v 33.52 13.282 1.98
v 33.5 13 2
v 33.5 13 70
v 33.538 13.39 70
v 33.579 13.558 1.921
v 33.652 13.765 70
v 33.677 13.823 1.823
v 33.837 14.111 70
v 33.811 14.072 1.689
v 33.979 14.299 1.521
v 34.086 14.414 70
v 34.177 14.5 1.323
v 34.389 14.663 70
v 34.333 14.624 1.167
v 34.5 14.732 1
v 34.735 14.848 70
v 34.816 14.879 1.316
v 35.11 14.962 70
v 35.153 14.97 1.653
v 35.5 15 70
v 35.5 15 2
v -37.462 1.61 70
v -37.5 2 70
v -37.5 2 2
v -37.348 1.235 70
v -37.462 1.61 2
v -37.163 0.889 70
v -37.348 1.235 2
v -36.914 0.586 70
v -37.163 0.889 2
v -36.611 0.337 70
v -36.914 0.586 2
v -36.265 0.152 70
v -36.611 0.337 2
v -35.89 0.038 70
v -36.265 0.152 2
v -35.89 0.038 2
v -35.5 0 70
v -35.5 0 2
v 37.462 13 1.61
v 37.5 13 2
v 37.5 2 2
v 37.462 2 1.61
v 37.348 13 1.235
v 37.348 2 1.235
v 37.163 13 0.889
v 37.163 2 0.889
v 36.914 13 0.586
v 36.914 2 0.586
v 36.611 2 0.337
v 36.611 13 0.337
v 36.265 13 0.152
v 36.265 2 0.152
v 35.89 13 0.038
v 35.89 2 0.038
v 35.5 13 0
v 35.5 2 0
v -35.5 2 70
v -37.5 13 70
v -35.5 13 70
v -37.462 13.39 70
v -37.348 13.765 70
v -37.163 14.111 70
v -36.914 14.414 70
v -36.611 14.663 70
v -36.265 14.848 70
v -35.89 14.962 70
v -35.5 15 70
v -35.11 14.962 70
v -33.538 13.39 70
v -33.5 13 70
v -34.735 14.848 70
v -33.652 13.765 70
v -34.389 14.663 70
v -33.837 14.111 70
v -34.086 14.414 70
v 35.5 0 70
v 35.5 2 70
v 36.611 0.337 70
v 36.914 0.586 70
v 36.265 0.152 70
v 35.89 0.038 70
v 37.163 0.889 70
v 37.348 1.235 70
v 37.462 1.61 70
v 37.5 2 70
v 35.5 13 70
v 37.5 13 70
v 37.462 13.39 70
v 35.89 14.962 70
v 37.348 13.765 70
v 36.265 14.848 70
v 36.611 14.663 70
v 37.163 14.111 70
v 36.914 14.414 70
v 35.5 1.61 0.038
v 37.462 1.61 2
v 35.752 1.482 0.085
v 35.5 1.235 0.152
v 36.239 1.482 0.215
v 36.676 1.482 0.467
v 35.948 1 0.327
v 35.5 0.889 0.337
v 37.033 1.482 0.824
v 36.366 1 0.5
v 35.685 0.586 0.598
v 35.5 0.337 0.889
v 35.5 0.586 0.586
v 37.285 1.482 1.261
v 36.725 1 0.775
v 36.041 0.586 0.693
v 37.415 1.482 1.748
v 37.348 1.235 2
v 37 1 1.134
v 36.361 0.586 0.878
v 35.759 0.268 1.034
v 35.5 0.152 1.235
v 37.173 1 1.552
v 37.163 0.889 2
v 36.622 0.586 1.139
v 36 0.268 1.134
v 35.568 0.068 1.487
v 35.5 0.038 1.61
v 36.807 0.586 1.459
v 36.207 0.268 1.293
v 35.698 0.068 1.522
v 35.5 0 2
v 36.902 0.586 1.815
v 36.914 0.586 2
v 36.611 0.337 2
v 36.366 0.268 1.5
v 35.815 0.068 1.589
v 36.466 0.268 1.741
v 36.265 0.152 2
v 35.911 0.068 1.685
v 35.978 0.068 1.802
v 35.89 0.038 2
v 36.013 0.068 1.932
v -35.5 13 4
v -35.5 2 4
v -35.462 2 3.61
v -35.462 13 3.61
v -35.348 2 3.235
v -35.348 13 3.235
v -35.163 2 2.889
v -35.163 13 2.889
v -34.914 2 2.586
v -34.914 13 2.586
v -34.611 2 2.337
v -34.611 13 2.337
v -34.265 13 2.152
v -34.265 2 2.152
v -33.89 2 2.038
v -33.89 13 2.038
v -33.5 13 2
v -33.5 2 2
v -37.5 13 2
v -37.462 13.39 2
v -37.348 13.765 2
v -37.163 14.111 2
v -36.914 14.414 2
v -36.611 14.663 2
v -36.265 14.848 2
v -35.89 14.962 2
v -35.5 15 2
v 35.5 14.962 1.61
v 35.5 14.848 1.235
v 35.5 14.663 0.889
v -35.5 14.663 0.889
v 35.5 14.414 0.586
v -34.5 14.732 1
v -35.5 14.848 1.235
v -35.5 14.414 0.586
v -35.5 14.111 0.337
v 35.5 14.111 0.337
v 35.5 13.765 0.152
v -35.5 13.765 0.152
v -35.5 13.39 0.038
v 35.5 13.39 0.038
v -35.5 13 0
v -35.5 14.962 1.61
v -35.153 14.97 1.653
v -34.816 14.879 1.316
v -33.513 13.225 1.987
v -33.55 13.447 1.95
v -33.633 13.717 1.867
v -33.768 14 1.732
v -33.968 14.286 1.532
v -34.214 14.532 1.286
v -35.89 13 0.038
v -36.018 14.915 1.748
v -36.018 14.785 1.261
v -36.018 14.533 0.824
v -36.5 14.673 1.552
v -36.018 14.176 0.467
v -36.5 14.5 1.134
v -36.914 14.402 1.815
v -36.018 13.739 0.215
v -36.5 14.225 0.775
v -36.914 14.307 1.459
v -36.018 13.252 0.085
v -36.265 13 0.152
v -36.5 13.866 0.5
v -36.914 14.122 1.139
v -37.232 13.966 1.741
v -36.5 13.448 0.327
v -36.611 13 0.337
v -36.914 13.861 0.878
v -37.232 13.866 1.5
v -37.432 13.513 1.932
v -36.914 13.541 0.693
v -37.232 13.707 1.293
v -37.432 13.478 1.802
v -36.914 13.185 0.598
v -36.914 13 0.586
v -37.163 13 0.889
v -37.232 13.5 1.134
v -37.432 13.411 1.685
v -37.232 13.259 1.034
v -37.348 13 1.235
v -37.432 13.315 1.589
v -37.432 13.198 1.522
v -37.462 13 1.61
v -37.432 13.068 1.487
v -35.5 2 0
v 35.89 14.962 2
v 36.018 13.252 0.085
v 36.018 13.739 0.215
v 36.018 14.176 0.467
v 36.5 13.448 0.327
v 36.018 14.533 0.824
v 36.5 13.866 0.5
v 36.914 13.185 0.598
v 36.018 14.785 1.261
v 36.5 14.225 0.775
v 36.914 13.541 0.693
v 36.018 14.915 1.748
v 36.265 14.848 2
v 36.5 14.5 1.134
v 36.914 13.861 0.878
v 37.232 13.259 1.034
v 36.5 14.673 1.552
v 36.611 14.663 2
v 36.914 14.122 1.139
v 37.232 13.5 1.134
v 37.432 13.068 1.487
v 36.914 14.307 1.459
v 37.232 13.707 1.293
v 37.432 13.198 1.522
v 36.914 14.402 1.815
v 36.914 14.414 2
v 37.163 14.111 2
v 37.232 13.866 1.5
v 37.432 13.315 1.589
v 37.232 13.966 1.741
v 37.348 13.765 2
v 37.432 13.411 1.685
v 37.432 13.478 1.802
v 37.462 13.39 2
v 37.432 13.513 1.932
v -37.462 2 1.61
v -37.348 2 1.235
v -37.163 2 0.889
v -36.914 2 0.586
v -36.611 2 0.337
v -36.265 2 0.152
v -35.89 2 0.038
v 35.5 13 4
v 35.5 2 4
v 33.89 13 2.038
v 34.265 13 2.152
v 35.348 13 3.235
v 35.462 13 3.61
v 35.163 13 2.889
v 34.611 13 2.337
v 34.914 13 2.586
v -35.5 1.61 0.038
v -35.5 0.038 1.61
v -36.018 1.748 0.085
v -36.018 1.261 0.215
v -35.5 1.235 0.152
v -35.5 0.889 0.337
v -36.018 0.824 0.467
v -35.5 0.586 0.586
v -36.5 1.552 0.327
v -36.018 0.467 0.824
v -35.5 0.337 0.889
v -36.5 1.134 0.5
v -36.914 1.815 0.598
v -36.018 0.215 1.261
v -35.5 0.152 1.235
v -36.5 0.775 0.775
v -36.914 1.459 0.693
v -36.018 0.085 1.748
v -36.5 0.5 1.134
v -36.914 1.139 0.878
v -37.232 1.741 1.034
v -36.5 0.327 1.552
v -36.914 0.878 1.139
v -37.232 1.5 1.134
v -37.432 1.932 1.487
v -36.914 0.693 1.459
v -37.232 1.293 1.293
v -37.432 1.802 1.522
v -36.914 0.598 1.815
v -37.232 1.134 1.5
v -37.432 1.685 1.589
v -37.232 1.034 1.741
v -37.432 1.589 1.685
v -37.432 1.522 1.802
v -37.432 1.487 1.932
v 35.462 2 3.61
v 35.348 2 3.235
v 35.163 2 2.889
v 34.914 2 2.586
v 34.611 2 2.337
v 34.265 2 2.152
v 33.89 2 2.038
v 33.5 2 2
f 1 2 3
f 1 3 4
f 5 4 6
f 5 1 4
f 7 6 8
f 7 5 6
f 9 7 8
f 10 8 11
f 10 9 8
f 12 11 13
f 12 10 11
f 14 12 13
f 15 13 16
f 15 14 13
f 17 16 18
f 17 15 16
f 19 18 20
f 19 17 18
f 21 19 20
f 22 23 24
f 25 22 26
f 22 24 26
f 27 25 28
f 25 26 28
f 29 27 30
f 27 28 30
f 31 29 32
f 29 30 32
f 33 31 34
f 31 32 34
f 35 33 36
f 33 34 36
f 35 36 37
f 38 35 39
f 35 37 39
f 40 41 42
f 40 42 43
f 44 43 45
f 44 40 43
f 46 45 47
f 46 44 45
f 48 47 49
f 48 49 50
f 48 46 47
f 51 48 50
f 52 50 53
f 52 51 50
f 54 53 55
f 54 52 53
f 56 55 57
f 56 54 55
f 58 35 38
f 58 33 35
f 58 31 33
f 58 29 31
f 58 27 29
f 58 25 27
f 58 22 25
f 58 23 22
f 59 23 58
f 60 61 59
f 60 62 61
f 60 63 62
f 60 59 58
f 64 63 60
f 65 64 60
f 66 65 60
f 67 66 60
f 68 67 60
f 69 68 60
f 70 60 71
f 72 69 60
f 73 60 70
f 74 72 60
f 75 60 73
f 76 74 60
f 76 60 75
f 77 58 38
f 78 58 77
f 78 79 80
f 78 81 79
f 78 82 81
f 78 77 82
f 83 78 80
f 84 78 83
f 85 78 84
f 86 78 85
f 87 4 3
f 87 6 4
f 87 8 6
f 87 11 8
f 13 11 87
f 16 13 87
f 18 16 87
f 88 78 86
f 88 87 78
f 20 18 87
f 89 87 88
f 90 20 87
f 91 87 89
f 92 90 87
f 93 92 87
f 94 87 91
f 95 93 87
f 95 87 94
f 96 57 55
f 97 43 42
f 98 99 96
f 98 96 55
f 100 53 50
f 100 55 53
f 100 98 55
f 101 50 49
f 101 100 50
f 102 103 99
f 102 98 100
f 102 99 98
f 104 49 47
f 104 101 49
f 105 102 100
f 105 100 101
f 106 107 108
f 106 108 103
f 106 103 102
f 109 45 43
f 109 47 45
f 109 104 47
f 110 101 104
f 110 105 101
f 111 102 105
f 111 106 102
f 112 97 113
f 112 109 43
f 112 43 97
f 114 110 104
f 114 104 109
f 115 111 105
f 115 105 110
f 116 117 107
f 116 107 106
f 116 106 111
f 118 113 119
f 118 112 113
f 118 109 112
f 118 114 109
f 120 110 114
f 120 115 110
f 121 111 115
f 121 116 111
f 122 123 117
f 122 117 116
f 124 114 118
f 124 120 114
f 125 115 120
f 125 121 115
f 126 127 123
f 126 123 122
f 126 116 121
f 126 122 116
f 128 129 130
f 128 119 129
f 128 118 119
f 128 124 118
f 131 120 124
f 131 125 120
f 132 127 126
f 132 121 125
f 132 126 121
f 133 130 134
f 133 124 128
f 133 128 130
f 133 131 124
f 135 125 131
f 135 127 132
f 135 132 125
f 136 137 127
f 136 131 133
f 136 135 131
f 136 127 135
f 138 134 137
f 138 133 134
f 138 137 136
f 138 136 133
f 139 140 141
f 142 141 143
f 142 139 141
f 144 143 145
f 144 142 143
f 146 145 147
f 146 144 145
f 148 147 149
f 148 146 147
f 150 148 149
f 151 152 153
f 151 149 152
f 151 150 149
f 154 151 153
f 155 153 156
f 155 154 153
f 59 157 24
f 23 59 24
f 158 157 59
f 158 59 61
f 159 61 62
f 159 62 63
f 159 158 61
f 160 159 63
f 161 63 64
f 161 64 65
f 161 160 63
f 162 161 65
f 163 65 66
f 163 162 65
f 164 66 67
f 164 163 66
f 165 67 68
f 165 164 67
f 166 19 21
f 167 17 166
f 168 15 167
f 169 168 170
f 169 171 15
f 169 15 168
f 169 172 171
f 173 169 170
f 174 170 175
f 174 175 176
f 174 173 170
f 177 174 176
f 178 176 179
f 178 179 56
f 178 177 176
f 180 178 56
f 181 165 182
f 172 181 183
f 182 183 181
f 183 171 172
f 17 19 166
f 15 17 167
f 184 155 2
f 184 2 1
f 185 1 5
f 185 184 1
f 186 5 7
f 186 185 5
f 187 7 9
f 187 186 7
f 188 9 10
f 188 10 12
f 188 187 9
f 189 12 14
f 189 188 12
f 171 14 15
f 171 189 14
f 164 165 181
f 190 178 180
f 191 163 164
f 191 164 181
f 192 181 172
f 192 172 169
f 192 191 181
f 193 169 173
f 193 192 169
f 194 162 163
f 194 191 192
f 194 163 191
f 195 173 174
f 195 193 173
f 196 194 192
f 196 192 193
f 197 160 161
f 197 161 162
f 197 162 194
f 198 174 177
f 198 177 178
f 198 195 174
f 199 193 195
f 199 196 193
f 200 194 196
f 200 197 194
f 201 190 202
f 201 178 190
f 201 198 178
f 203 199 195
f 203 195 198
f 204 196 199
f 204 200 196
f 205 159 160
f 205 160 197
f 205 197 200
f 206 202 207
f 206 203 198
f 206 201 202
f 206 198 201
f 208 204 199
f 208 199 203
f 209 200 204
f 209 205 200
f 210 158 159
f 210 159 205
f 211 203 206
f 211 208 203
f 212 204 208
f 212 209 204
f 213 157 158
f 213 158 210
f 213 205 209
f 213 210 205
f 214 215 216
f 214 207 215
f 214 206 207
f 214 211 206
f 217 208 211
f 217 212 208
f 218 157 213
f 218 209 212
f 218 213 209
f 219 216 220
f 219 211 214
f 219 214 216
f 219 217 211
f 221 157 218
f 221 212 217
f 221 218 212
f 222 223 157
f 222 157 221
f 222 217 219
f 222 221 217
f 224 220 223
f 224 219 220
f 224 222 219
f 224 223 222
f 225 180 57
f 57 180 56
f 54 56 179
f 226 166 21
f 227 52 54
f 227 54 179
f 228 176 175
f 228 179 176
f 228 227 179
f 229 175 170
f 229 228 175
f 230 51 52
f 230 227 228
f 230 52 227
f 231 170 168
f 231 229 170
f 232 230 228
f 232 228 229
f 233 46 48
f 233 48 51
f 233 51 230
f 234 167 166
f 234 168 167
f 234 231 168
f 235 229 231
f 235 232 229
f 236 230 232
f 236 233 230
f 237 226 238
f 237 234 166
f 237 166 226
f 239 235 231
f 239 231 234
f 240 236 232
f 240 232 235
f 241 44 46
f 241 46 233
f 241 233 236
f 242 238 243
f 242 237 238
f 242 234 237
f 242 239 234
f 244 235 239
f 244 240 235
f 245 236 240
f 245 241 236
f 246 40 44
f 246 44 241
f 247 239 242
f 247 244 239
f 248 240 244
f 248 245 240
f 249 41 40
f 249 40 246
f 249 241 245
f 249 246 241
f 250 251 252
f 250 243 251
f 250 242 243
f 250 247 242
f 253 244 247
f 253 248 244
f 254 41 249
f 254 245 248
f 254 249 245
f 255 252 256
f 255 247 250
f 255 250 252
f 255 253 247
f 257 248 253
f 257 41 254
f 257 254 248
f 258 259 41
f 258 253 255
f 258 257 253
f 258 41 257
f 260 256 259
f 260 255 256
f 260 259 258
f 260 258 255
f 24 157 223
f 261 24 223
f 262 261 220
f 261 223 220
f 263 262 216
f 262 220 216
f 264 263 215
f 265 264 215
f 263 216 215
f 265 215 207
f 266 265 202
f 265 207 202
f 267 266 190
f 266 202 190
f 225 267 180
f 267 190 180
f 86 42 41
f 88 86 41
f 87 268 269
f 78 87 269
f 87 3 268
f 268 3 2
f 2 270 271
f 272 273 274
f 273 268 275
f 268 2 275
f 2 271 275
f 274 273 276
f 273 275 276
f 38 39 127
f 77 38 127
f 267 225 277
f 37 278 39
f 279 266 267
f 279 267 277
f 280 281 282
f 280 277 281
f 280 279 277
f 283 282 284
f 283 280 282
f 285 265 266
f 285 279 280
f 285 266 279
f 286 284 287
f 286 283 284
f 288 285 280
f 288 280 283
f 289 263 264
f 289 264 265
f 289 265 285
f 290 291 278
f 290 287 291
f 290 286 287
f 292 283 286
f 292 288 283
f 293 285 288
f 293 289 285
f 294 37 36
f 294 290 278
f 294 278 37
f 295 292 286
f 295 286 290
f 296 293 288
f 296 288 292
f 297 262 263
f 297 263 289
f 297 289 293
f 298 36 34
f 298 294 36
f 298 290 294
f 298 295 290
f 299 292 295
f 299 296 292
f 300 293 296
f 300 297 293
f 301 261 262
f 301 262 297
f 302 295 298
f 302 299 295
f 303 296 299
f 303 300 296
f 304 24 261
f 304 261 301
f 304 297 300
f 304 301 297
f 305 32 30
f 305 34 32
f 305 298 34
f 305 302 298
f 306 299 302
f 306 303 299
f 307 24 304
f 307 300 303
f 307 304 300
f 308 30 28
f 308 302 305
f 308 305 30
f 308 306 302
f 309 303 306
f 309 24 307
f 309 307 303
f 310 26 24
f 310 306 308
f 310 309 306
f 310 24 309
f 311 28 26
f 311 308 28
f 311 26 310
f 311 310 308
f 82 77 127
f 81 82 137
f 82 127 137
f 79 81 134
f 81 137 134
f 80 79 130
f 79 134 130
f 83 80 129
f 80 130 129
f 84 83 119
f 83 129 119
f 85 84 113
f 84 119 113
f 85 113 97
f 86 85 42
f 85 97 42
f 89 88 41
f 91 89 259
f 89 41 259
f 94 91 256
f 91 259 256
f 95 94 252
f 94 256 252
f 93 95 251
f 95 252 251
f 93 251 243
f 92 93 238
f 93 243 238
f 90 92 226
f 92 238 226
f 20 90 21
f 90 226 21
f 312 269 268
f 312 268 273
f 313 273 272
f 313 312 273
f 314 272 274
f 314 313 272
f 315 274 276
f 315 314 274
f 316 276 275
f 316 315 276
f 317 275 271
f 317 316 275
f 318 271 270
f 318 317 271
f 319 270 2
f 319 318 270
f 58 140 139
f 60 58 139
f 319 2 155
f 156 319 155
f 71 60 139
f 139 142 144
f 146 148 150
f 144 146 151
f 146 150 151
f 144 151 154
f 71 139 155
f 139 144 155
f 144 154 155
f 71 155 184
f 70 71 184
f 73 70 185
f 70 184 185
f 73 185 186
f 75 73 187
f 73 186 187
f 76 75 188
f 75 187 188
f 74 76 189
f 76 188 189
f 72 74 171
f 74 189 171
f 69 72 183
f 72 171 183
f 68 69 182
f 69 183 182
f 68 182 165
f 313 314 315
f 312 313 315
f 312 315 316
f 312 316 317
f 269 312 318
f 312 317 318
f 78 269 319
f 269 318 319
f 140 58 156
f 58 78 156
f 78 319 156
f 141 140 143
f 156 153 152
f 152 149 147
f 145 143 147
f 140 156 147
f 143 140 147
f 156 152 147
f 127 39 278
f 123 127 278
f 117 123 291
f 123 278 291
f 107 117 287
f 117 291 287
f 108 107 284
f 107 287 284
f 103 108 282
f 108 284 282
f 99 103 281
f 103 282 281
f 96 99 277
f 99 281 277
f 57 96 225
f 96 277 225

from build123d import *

# Parameters (mm, degrees)
F0_DEPTH     = 70
F1_W         = 75
F1_H         = 15
F4_DEPTH     = 2
F2_T1_DEPTH  = 11
F2_T3_DEPTH  = 73
F2_T5_DEPTH  = 67
F2_T7_DEPTH  = 71
F2_S11_W     = 2.04
F2_S11_H     = 2.04
F2_T12_DEPTH = 2.04
F2_S17_W     = 2.04
F2_S17_H     = 2.04
F2_T18_DEPTH = 2.04
F2_S23_W     = 2.04
F2_S23_H     = 2.04
F2_T24_DEPTH = 2.04
F2_S29_W     = 2.04
F2_S29_H     = 2.04
F2_T30_DEPTH = 2.04
F2_T37_DEPTH = 73
F2_T42_DEPTH = 72
F2_T50_DEPTH = 72
F2_T55_DEPTH = 73
F2_T62_DEPTH = 16
F2_T67_DEPTH = 16


# Not quite as in the source:
# - a fillet or chamfer that OpenCascade refuses, or shapes differently, is made with other operations: its cross-section is extruded or revolved along the edge and cut away or added
# - a feature names something its author has since deleted; it is built from what else it names


with BuildPart() as f0:
    # F3 (on Top) → F0 (new body)
    with BuildSketch(Plane.XY):
        Polygon((-37.5, 15), (-37.5, 0), (37.5, 0), (37.5, 15), (33.5, 15), (33.5, 13), (35.5, 13), (35.5, 2), (-35.5, 2), (-35.5, 13), (-33.5, 13), (-33.5, 15), align=None)
    extrude(amount=F0_DEPTH)

    # F1 (on face) → F4 (join)
    with BuildSketch(Plane(origin=(0, 0, 0), x_dir=(1, 0, 0), z_dir=(0, 0, -1))):
        with Locations((0, -7.5)):
            Rectangle(F1_W, F1_H)
    extrude(amount=-F4_DEPTH)

    # F2: fillet of radius 2 on 13 edges, made by hand

    # F2_s2 → F2_t1 (cut)
    with BuildSketch(Plane.XZ.offset(-13)):
        with BuildLine():
            ThreePointArc((37.5, 2), (36.9142135624, 0.5857864376), (35.5, 0))
            Line((35.5, 0), (37.5, 0))
            Line((37.5, 0), (37.5, 2))
        make_face()
        with BuildLine():
            ThreePointArc((-37.5, 2), (-36.9142135624, 0.5857864376), (-35.5, 0))
            Line((-35.5, 0), (-37.5, 0))
            Line((-37.5, 0), (-37.5, 2))
        make_face()
    extrude(amount=F2_T1_DEPTH, mode=Mode.SUBTRACT)

    # F2_s4 → F2_t3 (cut)
    with BuildSketch(Plane.XY.offset(2)):
        with BuildLine():
            ThreePointArc((-37.5, 2), (-36.9142135624, 0.5857864376), (-35.5, 0))
            Line((-35.5, 0), (-37.5, 0))
            Line((-37.5, 0), (-37.5, 2))
        make_face()
        with BuildLine():
            ThreePointArc((35.5, 0), (36.9142135624, 0.5857864376), (37.5, 2))
            Line((37.5, 2), (37.5, 0))
            Line((37.5, 0), (35.5, 0))
        make_face()
        with BuildLine():
            ThreePointArc((-37.5, 13), (-36.9142135624, 14.4142135624), (-35.5, 15))
            Line((-35.5, 15), (-37.5, 15))
            Line((-37.5, 15), (-37.5, 13))
        make_face()
        with BuildLine():
            ThreePointArc((37.5, 13), (36.9142135624, 14.4142135624), (35.5, 15))
            Line((35.5, 15), (37.5, 15))
            Line((37.5, 15), (37.5, 13))
        make_face()
        with BuildLine():
            ThreePointArc((-33.5, 13), (-34.0857864376, 14.4142135624), (-35.5, 15))
            Line((-35.5, 15), (-33.5, 15))
            Line((-33.5, 15), (-33.5, 13))
        make_face()
        with BuildLine():
            ThreePointArc((33.5, 13), (34.0857864376, 14.4142135624), (35.5, 15))
            Line((35.5, 15), (33.5, 15))
            Line((33.5, 15), (33.5, 13))
        make_face()
    extrude(amount=F2_T3_DEPTH, mode=Mode.SUBTRACT)

    # F2_s6 → F2_t5 (cut)
    with BuildSketch(Plane.YZ.offset(-33.5)):
        with BuildLine():
            ThreePointArc((13, 2), (14.4142135624, 1.4142135624), (15, 0))
            Line((15, 0), (15, 2))
            Line((15, 2), (13, 2))
        make_face()
    extrude(amount=F2_T5_DEPTH, mode=Mode.SUBTRACT)

    # F2_s8 → F2_t7 (cut)
    with BuildSketch(Plane.YZ.offset(-35.5)):
        with BuildLine():
            ThreePointArc((0, 2), (0.5857864376, 0.5857864376), (2, 0))
            Line((2, 0), (0, 0))
            Line((0, 0), (0, 2))
        make_face()
        with BuildLine():
            ThreePointArc((15, 2), (14.4142135624, 0.5857864376), (13, 0))
            Line((13, 0), (15, 0))
            Line((15, 0), (15, 2))
        make_face()
    extrude(amount=F2_T7_DEPTH, mode=Mode.SUBTRACT)


with BuildPart() as f2_tool10:
    # F2_s11 → F2_t12 (new body)
    with BuildSketch(Plane.XZ.offset(-2)):
        with Locations((36.52, 0.98)):
            Rectangle(F2_S11_W, F2_S11_H)
    extrude(amount=F2_T12_DEPTH)

    # F2_s13 → F2_t14 (revolve, cut)
    with BuildSketch(Plane(origin=(35.5, 2, 2), x_dir=(-0.7071067812, 0, 0.7071067812), z_dir=(0.7071067812, 0, 0.7071067812))):
        with BuildLine():
            ThreePointArc((0, -2), (2, 0), (0, 2))
            Line((0, 2), (0, -2))
        make_face()
    revolve(axis=Axis((35.5, 2, 2), (0, -1, 0)), mode=Mode.SUBTRACT)


with BuildPart() as f0_1:
    add(f0.part)

    # F2_t9: cut F2_tool10
    add(f2_tool10.part, mode=Mode.SUBTRACT)


with BuildPart() as f2_tool16:
    # F2_s17 → F2_t18 (new body)
    with BuildSketch(Plane.YZ.offset(35.5)):
        with Locations((14.02, 0.98)):
            Rectangle(F2_S17_W, F2_S17_H)
    extrude(amount=F2_T18_DEPTH)

    # F2_s19 → F2_t20 (revolve, cut)
    with BuildSketch(Plane(origin=(35.5, 13, 2), x_dir=(0, -0.7071067812, 0.7071067812), z_dir=(0, 0.7071067812, 0.7071067812))):
        with BuildLine():
            ThreePointArc((0, -2), (2, 0), (0, 2))
            Line((0, 2), (0, -2))
        make_face()
    revolve(axis=Axis((35.5, 13, 2), (1, 0, 0)), mode=Mode.SUBTRACT)


with BuildPart() as f0_2:
    add(f0_1.part)

    # F2_t15: cut F2_tool16
    add(f2_tool16.part, mode=Mode.SUBTRACT)


with BuildPart() as f2_tool22:
    # F2_s23 → F2_t24 (new body)
    with BuildSketch(Plane.YZ.offset(-35.5)):
        with Locations((14.02, 0.98)):
            Rectangle(F2_S23_W, F2_S23_H)
    extrude(amount=-F2_T24_DEPTH)

    # F2_s25 → F2_t26 (revolve, cut)
    with BuildSketch(Plane(origin=(-35.5, 13, 2), x_dir=(0, -0.7071067812, 0.7071067812), z_dir=(0, -0.7071067812, -0.7071067812))):
        with BuildLine():
            ThreePointArc((0, -2), (2, 0), (0, 2))
            Line((0, 2), (0, -2))
        make_face()
    revolve(axis=Axis((-35.5, 13, 2), (-1, 0, 0)), mode=Mode.SUBTRACT)


with BuildPart() as f0_3:
    add(f0_2.part)

    # F2_t21: cut F2_tool22
    add(f2_tool22.part, mode=Mode.SUBTRACT)


with BuildPart() as f2_tool28:
    # F2_s29 → F2_t30 (new body)
    with BuildSketch(Plane.YZ.offset(-35.5)):
        with Locations((0.98, 0.98)):
            Rectangle(F2_S29_W, F2_S29_H)
    extrude(amount=-F2_T30_DEPTH)

    # F2_s31 → F2_t32 (revolve, cut)
    with BuildSketch(Plane(origin=(-35.5, 2, 2), x_dir=(0, 0.7071067812, 0.7071067812), z_dir=(0, -0.7071067812, 0.7071067812))):
        with BuildLine():
            ThreePointArc((0, -2), (2, 0), (0, 2))
            Line((0, 2), (0, -2))
        make_face()
    revolve(axis=Axis((-35.5, 2, 2), (-1, 0, 0)), mode=Mode.SUBTRACT)


with BuildPart() as f0_4:
    add(f0_3.part)

    # F2_t27: cut F2_tool28
    add(f2_tool28.part, mode=Mode.SUBTRACT)


with BuildPart() as f2_tool35:
    # F2_s36 → F2_t37 (new body)
    with BuildSketch(Plane.XY.offset(-3)):
        with BuildLine():
            ThreePointArc((-33.5, 13), (-34.0857864376, 14.4142135624), (-35.5, 15))
            Line((-35.5, 15), (-33.5, 15))
            Line((-33.5, 15), (-33.5, 13))
        make_face()
    extrude(amount=F2_T37_DEPTH)

    split(bisect_by=Plane.XY.offset(2), keep=Keep.BOTTOM)

    split(bisect_by=Plane.XY, keep=Keep.TOP)


with BuildPart() as f2_tool40:
    # F2_s41 → F2_t42 (new body)
    with BuildSketch(Plane.YZ.offset(-38.5)):
        with BuildLine():
            ThreePointArc((13, 2), (14.4142135624, 1.4142135624), (15, 0))
            Line((15, 0), (15, 2))
            Line((15, 2), (13, 2))
        make_face()
    extrude(amount=F2_T42_DEPTH)

    split(bisect_by=Plane.YZ.offset(-33.5), keep=Keep.BOTTOM)

    split(bisect_by=Plane.YZ.offset(-35.5), keep=Keep.TOP)


with BuildPart() as f2_tool35_1:
    add(f2_tool35.part)

    # F2_t45: intersect F2_tool40
    add(f2_tool40.part, mode=Mode.INTERSECT)


with BuildPart() as f0_5:
    add(f0_4.part)

    # F2_t33: cut F2_tool35
    add(f2_tool35_1.part, mode=Mode.SUBTRACT)


with BuildPart() as f2_tool48:
    # F2_s49 → F2_t50 (new body)
    with BuildSketch(Plane.YZ.offset(-33.5)):
        with BuildLine():
            ThreePointArc((13, 2), (14.4142135624, 1.4142135624), (15, 0))
            Line((15, 0), (15, 2))
            Line((15, 2), (13, 2))
        make_face()
    extrude(amount=F2_T50_DEPTH)

    split(bisect_by=Plane.YZ.offset(35.5), keep=Keep.BOTTOM)

    split(bisect_by=Plane.YZ.offset(33.5), keep=Keep.TOP)


with BuildPart() as f2_tool53:
    # F2_s54 → F2_t55 (new body)
    with BuildSketch(Plane.XY.offset(-3)):
        with BuildLine():
            ThreePointArc((33.5, 13), (34.0857864376, 14.4142135624), (35.5, 15))
            Line((35.5, 15), (33.5, 15))
            Line((33.5, 15), (33.5, 13))
        make_face()
    extrude(amount=F2_T55_DEPTH)

    split(bisect_by=Plane.XY.offset(2), keep=Keep.BOTTOM)

    split(bisect_by=Plane.XY, keep=Keep.TOP)


with BuildPart() as f2_tool48_1:
    add(f2_tool48.part)

    # F2_t58: intersect F2_tool53
    add(f2_tool53.part, mode=Mode.INTERSECT)


with BuildPart() as f0_6:
    add(f0_5.part)

    # F2_t46: cut F2_tool48
    add(f2_tool48_1.part, mode=Mode.SUBTRACT)


with BuildPart() as f2_tool60:
    # F2_s61 → F2_t62 (new body)
    with BuildSketch(Plane.XZ.offset(3)):
        with BuildLine():
            ThreePointArc((35.5, 4), (34.9142135624, 2.5857864376), (33.5, 2))
            Line((33.5, 2), (35.5, 2))
            Line((35.5, 2), (35.5, 4))
        make_face()
    extrude(amount=-F2_T62_DEPTH)

    split(bisect_by=Plane.XZ, keep=Keep.BOTTOM)


with BuildPart() as f0_7:
    add(f0_6.part)

    # F2_t59: union F2_tool60
    add(f2_tool60.part)


with BuildPart() as f2_tool65:
    # F2_s66 → F2_t67 (new body)
    with BuildSketch(Plane.XZ.offset(-13)):
        with BuildLine():
            ThreePointArc((-35.5, 4), (-34.9142135624, 2.5857864376), (-33.5, 2))
            Line((-33.5, 2), (-35.5, 2))
            Line((-35.5, 2), (-35.5, 4))
        make_face()
    extrude(amount=F2_T67_DEPTH)

    split(bisect_by=Plane.XZ, keep=Keep.BOTTOM)


with BuildPart() as f0_8:
    add(f0_7.part)

    # F2_t64: union F2_tool65
    add(f2_tool65.part)


solid = f0_8.part
